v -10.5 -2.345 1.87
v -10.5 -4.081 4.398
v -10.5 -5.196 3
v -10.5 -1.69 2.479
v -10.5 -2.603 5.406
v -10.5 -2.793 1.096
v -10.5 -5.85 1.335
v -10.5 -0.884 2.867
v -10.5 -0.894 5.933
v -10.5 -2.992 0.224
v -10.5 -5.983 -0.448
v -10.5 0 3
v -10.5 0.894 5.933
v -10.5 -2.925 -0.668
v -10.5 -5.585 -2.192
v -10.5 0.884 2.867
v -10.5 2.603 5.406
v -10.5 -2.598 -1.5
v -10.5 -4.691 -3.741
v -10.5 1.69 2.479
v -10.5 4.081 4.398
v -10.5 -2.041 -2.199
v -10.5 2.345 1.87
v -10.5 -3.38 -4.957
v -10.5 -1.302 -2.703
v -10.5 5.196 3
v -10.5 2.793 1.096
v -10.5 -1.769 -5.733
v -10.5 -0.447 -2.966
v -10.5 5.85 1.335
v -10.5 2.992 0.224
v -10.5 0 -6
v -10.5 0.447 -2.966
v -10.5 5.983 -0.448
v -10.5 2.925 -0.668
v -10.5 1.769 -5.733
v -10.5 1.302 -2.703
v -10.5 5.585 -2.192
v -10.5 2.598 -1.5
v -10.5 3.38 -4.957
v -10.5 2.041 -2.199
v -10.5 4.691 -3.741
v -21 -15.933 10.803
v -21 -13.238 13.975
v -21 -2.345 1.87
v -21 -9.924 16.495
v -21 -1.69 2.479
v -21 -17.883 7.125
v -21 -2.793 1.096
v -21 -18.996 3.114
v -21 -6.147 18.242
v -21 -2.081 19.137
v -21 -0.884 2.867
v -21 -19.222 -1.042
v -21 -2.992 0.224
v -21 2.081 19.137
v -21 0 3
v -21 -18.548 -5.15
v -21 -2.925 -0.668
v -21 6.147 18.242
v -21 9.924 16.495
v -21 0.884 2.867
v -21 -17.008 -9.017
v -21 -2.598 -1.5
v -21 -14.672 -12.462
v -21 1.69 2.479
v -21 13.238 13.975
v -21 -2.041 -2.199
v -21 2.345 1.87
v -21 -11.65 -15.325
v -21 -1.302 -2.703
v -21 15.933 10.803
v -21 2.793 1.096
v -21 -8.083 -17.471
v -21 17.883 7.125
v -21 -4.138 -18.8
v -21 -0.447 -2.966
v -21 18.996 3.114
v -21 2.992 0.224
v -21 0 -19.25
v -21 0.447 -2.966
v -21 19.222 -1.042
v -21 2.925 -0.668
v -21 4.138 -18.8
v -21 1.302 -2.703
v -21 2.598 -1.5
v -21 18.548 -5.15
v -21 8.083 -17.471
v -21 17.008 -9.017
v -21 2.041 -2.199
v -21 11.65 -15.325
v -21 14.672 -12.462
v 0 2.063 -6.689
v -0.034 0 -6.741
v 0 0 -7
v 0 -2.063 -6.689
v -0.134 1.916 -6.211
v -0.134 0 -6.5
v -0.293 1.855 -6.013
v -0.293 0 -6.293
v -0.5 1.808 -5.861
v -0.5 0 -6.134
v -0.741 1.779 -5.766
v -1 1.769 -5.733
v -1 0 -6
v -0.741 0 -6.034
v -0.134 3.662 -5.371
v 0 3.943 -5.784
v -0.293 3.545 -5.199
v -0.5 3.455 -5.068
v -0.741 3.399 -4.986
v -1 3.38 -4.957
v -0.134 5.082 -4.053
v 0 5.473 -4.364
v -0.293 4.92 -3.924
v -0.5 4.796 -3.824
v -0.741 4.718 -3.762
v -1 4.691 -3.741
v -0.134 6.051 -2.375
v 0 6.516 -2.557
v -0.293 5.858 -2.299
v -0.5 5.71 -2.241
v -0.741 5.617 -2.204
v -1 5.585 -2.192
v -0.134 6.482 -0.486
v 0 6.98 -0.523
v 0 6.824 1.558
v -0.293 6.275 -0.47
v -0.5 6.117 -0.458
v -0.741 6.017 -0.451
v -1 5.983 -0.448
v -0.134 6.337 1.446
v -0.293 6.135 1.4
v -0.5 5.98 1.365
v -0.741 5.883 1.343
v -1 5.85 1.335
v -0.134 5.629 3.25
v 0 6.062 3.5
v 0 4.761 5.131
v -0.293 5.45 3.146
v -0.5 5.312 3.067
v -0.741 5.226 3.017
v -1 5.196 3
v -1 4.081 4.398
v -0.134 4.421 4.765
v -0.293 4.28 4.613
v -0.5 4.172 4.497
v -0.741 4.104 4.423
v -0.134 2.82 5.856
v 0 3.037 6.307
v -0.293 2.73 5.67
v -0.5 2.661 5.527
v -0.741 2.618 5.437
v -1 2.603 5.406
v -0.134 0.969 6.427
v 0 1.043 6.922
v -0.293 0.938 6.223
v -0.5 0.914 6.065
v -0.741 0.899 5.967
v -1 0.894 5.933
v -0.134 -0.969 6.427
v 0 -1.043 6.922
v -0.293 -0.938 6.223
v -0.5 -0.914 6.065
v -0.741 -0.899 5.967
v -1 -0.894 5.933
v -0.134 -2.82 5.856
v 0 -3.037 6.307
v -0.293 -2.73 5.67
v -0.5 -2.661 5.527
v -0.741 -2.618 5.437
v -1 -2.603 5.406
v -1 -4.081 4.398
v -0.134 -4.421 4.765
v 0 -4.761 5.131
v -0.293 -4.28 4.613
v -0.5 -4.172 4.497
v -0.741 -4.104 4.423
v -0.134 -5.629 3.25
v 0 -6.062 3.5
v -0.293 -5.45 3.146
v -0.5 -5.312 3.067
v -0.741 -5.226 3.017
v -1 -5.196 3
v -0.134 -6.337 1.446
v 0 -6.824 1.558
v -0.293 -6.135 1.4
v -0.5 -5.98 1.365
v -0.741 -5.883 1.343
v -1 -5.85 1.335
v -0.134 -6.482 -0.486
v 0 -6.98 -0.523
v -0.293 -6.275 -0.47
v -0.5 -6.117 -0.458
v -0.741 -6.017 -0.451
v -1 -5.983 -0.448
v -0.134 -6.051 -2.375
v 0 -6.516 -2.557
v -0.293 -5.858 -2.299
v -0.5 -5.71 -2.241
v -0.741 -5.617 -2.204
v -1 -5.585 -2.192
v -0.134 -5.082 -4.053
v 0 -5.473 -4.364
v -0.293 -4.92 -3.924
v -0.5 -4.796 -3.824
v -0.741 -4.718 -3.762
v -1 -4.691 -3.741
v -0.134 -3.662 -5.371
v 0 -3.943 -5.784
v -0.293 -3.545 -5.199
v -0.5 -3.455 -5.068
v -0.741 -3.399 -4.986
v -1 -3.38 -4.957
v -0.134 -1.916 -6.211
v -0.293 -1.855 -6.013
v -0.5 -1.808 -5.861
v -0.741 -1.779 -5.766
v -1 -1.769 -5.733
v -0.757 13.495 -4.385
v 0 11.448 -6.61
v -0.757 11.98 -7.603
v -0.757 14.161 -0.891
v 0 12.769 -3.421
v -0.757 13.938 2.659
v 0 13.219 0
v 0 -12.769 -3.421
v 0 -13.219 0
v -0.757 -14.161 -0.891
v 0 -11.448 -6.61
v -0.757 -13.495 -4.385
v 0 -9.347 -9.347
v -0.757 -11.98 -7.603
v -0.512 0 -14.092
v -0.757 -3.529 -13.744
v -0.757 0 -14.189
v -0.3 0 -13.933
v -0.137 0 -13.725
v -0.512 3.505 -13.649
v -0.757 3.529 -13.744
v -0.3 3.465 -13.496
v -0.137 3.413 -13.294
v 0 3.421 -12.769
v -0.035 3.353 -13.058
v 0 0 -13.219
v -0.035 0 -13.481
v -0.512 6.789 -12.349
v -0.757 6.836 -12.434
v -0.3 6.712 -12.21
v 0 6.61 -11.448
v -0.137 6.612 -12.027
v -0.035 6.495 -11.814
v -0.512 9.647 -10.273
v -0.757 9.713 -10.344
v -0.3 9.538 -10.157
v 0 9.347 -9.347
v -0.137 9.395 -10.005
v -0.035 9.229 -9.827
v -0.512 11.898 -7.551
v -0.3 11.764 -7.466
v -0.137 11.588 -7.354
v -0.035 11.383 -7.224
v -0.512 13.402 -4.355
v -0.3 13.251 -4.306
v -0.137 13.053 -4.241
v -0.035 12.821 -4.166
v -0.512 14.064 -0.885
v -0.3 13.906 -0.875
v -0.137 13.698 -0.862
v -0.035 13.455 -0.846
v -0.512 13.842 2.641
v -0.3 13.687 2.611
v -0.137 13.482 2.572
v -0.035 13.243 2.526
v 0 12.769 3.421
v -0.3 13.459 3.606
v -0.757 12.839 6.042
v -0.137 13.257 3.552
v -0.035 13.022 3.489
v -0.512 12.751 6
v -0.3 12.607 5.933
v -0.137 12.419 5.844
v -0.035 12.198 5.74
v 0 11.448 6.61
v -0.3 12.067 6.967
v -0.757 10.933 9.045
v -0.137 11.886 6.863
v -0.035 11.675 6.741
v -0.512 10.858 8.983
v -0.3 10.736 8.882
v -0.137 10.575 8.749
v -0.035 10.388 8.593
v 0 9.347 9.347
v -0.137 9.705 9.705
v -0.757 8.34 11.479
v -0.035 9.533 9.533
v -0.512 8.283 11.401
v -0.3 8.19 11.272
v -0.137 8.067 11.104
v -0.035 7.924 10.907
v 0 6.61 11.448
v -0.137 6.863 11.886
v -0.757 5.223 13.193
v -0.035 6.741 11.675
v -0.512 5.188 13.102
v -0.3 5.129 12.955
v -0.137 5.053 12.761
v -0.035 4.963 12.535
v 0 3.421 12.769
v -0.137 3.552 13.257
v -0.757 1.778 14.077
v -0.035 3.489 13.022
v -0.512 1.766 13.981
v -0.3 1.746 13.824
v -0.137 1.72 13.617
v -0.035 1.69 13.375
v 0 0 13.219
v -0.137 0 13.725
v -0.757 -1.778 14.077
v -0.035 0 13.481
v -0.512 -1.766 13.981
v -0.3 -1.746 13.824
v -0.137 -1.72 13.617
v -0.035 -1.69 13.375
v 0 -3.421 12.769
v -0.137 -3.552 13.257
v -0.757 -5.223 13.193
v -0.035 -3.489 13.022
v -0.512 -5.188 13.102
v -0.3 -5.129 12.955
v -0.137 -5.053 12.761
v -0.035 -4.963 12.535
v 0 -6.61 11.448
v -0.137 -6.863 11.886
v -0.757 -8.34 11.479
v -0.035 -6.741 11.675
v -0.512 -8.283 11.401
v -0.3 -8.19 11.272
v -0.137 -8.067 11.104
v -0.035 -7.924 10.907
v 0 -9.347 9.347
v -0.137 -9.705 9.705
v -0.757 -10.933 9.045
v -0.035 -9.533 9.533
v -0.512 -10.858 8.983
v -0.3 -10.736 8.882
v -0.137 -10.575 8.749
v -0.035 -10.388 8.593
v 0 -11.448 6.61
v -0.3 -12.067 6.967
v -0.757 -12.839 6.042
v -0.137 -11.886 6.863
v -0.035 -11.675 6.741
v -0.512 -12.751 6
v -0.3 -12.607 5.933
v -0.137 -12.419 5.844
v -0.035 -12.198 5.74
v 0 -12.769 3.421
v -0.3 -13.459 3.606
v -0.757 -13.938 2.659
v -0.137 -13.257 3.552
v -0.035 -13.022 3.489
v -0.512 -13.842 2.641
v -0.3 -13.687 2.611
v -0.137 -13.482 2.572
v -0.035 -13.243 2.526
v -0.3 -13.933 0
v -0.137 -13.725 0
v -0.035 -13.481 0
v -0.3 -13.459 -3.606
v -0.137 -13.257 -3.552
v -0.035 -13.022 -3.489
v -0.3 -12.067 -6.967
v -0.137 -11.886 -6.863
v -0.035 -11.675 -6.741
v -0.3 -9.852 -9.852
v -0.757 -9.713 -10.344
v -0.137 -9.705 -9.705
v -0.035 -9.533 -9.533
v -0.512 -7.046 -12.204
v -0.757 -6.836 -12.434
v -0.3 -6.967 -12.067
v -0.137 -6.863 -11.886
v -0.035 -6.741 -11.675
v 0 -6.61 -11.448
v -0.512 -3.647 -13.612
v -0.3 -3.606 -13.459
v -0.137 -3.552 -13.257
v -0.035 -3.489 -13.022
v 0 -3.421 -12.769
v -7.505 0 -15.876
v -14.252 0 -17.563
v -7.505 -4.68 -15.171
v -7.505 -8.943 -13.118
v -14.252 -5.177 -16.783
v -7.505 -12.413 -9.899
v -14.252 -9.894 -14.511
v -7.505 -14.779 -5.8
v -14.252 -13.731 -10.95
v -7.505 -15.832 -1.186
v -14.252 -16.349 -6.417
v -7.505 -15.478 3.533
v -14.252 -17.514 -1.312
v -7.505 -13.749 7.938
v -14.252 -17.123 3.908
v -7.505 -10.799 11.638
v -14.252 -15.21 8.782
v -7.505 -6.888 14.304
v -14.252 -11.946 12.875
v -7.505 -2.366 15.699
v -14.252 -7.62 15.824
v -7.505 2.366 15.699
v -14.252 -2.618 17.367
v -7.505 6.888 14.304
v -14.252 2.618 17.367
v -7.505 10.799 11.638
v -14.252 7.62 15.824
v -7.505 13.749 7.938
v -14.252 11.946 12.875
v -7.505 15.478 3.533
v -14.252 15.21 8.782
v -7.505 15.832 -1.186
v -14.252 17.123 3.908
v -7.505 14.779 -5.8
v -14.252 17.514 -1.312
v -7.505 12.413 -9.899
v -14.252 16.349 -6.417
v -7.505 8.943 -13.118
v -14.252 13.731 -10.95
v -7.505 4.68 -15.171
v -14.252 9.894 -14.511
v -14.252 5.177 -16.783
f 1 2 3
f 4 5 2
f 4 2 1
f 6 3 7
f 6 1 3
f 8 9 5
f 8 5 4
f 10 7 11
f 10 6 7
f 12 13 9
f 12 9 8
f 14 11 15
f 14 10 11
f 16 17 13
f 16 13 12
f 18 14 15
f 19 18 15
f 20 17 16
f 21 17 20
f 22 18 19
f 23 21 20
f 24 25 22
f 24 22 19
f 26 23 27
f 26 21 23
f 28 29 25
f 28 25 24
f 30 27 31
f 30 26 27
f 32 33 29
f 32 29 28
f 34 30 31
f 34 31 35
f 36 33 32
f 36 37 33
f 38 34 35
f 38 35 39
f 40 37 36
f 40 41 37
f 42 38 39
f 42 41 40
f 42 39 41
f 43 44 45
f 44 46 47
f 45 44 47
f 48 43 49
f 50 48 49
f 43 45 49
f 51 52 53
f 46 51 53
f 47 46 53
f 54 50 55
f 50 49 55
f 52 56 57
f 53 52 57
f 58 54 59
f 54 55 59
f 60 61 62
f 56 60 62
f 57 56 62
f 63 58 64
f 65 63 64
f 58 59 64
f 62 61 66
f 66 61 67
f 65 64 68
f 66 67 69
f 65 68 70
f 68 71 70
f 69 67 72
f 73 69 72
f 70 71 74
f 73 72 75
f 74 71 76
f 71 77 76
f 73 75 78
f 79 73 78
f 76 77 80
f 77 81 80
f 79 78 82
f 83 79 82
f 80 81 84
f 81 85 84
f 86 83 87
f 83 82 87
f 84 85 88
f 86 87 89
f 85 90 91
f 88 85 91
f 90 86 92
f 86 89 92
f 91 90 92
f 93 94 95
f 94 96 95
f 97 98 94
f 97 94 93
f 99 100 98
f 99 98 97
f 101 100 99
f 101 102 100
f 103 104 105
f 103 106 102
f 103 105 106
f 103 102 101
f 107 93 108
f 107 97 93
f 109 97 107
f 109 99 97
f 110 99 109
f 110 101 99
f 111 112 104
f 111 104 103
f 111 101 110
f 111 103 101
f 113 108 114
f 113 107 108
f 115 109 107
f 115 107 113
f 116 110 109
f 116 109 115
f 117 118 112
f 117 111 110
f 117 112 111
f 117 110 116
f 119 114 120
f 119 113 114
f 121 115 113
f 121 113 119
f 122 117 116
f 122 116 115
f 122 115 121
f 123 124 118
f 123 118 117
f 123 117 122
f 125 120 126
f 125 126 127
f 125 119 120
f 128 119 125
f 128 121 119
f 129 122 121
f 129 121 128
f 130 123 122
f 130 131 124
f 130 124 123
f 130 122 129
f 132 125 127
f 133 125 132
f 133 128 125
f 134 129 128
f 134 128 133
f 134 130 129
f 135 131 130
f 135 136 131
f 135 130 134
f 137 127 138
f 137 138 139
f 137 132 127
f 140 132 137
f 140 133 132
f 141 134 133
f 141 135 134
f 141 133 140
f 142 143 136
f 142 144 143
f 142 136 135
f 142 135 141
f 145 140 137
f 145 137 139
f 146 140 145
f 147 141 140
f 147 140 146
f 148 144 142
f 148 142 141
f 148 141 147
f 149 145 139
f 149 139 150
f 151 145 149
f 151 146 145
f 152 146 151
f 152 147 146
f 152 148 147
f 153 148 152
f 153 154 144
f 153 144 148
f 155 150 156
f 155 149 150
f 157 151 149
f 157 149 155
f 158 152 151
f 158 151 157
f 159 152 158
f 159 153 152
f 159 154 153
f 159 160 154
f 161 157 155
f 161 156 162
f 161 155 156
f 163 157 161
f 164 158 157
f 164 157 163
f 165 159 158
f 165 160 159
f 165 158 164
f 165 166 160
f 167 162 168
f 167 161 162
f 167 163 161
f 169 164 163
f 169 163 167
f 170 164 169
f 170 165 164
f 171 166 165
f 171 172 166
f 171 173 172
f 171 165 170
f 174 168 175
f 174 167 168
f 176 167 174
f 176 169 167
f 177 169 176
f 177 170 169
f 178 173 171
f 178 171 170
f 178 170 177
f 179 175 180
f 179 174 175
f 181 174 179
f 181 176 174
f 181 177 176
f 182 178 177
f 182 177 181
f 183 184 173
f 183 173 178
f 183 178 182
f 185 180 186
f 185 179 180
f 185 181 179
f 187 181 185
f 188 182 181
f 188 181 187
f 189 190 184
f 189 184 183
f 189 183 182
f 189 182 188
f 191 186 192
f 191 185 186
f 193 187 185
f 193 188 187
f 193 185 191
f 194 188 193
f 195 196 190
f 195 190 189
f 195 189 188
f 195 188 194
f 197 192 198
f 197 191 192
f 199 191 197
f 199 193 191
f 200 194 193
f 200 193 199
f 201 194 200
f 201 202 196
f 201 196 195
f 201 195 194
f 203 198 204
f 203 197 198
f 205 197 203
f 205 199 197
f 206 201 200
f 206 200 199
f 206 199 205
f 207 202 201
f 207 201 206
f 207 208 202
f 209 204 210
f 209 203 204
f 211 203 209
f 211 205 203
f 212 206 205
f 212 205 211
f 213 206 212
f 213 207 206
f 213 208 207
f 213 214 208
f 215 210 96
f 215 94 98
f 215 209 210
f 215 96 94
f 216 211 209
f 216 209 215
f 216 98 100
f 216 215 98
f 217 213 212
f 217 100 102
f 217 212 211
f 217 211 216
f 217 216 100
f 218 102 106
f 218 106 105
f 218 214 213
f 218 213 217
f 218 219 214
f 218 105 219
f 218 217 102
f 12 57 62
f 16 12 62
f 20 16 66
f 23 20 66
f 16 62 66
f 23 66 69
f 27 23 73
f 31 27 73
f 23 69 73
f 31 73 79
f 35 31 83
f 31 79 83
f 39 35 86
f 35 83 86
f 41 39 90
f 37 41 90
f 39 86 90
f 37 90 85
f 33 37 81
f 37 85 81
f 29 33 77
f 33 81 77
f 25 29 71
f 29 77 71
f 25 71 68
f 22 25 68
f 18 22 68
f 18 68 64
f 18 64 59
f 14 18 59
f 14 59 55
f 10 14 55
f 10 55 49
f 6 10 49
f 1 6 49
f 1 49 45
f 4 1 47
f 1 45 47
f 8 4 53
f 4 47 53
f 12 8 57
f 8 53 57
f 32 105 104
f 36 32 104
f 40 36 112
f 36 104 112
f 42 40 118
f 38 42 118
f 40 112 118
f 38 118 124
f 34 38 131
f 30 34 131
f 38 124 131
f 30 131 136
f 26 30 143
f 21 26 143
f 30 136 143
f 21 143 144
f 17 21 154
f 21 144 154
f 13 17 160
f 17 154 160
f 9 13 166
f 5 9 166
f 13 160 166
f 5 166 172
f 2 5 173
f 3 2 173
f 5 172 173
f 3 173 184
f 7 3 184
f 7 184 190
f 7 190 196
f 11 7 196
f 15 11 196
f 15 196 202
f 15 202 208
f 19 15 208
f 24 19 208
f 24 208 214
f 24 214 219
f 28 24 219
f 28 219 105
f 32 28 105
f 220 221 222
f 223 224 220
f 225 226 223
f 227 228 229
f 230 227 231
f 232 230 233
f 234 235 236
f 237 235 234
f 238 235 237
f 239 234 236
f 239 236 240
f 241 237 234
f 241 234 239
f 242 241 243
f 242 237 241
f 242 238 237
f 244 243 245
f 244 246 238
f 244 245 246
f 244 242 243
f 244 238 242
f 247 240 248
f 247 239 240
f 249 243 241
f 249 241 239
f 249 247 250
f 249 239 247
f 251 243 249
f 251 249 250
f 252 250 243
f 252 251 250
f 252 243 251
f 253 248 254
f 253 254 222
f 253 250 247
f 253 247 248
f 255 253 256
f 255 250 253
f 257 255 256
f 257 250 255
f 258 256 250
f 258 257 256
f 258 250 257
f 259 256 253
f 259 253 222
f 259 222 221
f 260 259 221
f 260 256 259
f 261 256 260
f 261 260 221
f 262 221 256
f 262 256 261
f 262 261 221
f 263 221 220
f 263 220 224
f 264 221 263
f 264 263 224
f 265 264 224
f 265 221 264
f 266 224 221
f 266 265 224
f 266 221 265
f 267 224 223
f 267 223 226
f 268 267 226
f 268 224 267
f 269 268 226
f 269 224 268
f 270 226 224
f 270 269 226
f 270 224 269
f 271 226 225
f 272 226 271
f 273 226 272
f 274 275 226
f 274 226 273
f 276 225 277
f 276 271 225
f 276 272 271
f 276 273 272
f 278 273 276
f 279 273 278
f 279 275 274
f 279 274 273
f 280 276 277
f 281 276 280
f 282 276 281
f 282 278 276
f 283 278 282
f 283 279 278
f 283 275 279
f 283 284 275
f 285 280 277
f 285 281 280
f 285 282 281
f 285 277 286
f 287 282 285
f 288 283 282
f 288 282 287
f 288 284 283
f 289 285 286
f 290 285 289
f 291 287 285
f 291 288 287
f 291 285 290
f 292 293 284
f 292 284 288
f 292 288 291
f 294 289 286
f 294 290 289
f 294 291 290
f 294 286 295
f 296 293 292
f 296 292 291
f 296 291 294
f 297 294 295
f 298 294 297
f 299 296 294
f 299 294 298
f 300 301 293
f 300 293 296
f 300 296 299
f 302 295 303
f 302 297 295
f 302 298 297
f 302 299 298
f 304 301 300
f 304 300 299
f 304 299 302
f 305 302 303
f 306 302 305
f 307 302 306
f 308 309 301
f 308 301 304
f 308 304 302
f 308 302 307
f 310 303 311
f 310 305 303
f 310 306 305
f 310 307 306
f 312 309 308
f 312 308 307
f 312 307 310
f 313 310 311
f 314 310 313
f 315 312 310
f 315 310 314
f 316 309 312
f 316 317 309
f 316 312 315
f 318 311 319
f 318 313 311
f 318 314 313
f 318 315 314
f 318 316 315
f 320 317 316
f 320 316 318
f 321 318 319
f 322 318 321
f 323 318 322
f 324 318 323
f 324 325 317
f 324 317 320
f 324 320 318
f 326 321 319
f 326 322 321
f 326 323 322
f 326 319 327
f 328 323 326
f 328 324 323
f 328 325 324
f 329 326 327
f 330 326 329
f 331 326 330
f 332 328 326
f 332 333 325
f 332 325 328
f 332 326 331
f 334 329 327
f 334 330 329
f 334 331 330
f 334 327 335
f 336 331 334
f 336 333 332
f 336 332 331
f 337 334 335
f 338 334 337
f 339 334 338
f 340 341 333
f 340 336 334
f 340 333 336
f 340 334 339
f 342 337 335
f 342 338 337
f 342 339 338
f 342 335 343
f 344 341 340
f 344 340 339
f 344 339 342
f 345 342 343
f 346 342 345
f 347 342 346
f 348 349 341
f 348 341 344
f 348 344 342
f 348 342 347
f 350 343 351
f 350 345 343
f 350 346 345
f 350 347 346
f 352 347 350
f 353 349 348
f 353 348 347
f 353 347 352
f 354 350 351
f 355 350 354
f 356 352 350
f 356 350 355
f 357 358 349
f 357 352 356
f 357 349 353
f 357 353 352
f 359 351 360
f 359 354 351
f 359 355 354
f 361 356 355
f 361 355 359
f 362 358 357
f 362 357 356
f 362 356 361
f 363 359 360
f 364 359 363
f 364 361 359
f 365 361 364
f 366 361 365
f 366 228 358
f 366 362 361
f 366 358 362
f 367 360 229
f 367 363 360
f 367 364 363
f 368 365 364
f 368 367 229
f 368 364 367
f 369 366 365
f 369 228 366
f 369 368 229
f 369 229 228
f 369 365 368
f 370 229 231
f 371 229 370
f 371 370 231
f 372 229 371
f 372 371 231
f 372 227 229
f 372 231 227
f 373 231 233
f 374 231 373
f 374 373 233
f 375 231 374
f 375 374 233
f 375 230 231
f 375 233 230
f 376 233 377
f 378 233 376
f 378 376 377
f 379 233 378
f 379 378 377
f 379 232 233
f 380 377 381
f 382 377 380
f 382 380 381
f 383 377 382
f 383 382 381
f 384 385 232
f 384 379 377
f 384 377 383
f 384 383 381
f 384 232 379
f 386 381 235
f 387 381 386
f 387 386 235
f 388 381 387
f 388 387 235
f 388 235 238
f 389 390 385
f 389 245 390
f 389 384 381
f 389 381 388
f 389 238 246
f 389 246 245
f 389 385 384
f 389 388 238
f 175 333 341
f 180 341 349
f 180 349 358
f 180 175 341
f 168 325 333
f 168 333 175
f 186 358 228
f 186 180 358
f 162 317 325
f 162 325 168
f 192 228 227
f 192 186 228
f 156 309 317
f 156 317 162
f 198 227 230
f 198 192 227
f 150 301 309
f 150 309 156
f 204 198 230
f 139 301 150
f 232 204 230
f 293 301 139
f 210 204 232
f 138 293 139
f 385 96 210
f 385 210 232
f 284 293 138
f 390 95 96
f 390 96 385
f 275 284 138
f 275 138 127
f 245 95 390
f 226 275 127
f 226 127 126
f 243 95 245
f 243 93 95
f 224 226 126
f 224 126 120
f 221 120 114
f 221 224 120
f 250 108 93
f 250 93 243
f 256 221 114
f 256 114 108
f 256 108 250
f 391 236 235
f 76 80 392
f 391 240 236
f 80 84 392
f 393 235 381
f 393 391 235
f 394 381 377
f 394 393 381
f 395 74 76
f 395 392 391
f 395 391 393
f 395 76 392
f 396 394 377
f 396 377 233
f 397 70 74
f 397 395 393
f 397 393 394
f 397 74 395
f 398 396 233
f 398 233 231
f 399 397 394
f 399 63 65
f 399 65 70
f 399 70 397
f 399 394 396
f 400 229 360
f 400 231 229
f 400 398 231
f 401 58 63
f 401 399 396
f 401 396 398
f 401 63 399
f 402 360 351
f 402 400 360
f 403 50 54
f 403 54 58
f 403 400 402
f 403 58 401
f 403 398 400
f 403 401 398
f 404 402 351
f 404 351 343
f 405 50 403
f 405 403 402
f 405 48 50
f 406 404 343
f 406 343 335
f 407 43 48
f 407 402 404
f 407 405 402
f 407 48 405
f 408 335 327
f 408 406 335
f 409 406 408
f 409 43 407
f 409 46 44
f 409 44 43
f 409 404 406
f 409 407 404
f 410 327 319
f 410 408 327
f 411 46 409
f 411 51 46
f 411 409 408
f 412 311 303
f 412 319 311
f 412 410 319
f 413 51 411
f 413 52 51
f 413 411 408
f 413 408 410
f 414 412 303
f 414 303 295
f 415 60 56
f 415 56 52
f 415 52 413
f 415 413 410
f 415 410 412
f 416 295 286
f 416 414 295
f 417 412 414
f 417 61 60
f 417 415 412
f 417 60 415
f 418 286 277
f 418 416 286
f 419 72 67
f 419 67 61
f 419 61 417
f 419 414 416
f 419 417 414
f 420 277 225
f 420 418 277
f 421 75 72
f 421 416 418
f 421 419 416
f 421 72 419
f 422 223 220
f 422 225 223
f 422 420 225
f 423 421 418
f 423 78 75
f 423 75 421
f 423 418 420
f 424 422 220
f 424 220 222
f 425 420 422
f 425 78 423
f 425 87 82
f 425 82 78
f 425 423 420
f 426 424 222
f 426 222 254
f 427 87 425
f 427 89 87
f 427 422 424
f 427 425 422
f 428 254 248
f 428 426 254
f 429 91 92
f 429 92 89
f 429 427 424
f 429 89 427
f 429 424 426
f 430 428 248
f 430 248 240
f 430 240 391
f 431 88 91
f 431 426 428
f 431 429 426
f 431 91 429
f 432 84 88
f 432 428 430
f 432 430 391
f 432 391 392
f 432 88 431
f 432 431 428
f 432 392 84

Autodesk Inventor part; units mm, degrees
ref_plane "YZ Plane" through (0, 0, 0) normal (1, 0, 0) x (0, 1, 0)
ref_plane "XZ Plane" through (0, 0, 0) normal (0, 1, 0) x (-1, 0, 0)
ref_plane "XY Plane" through (0, 0, 0) normal (0, 0, 1) x (1, 0, 0)
sketch "Sketch2" plane through (0, 0, 0) normal (0, 1, 0) x (-1, 0, 0)
  line L0 (0, 0) -> (0, -14)
  line L1 (0, -14) -> (21, -19.25)
  line L2 (21, -19.25) -> (21, 0)
  line L3 (21, 0) -> (0, 0)
  dimension "d1" = 14
  dimension "d2" = 21
  dimension "d3" = 19.25
revolve "Revolution1" add sketch "Sketch2" angle 360 about axis through (-21, 0, 0) along (1, 0, 0)
sketch "Sketch3" plane through (-21, 0, 0) normal (-1, 0, 0) x (0, 0, 1)
  circle A0 centre (0, 0) radius 3
  dimension "d5" = 6
extrude "Extrusion1" cut sketch "Sketch3" against normal through all
sketch "Sketch4" plane through (0, 0, 0) normal (1, 0, 0) x (0, 0, -1)
  circle A0 centre (0, 0) radius 6
  dimension "d8" = 12
extrude "Extrusion2" cut sketch "Sketch4" against normal blind 10.5
fillet "Fillet1" radius 1 2 edges at (0, 0, 14) (0, 0, 6)
properties part number "Rubberfoot"
